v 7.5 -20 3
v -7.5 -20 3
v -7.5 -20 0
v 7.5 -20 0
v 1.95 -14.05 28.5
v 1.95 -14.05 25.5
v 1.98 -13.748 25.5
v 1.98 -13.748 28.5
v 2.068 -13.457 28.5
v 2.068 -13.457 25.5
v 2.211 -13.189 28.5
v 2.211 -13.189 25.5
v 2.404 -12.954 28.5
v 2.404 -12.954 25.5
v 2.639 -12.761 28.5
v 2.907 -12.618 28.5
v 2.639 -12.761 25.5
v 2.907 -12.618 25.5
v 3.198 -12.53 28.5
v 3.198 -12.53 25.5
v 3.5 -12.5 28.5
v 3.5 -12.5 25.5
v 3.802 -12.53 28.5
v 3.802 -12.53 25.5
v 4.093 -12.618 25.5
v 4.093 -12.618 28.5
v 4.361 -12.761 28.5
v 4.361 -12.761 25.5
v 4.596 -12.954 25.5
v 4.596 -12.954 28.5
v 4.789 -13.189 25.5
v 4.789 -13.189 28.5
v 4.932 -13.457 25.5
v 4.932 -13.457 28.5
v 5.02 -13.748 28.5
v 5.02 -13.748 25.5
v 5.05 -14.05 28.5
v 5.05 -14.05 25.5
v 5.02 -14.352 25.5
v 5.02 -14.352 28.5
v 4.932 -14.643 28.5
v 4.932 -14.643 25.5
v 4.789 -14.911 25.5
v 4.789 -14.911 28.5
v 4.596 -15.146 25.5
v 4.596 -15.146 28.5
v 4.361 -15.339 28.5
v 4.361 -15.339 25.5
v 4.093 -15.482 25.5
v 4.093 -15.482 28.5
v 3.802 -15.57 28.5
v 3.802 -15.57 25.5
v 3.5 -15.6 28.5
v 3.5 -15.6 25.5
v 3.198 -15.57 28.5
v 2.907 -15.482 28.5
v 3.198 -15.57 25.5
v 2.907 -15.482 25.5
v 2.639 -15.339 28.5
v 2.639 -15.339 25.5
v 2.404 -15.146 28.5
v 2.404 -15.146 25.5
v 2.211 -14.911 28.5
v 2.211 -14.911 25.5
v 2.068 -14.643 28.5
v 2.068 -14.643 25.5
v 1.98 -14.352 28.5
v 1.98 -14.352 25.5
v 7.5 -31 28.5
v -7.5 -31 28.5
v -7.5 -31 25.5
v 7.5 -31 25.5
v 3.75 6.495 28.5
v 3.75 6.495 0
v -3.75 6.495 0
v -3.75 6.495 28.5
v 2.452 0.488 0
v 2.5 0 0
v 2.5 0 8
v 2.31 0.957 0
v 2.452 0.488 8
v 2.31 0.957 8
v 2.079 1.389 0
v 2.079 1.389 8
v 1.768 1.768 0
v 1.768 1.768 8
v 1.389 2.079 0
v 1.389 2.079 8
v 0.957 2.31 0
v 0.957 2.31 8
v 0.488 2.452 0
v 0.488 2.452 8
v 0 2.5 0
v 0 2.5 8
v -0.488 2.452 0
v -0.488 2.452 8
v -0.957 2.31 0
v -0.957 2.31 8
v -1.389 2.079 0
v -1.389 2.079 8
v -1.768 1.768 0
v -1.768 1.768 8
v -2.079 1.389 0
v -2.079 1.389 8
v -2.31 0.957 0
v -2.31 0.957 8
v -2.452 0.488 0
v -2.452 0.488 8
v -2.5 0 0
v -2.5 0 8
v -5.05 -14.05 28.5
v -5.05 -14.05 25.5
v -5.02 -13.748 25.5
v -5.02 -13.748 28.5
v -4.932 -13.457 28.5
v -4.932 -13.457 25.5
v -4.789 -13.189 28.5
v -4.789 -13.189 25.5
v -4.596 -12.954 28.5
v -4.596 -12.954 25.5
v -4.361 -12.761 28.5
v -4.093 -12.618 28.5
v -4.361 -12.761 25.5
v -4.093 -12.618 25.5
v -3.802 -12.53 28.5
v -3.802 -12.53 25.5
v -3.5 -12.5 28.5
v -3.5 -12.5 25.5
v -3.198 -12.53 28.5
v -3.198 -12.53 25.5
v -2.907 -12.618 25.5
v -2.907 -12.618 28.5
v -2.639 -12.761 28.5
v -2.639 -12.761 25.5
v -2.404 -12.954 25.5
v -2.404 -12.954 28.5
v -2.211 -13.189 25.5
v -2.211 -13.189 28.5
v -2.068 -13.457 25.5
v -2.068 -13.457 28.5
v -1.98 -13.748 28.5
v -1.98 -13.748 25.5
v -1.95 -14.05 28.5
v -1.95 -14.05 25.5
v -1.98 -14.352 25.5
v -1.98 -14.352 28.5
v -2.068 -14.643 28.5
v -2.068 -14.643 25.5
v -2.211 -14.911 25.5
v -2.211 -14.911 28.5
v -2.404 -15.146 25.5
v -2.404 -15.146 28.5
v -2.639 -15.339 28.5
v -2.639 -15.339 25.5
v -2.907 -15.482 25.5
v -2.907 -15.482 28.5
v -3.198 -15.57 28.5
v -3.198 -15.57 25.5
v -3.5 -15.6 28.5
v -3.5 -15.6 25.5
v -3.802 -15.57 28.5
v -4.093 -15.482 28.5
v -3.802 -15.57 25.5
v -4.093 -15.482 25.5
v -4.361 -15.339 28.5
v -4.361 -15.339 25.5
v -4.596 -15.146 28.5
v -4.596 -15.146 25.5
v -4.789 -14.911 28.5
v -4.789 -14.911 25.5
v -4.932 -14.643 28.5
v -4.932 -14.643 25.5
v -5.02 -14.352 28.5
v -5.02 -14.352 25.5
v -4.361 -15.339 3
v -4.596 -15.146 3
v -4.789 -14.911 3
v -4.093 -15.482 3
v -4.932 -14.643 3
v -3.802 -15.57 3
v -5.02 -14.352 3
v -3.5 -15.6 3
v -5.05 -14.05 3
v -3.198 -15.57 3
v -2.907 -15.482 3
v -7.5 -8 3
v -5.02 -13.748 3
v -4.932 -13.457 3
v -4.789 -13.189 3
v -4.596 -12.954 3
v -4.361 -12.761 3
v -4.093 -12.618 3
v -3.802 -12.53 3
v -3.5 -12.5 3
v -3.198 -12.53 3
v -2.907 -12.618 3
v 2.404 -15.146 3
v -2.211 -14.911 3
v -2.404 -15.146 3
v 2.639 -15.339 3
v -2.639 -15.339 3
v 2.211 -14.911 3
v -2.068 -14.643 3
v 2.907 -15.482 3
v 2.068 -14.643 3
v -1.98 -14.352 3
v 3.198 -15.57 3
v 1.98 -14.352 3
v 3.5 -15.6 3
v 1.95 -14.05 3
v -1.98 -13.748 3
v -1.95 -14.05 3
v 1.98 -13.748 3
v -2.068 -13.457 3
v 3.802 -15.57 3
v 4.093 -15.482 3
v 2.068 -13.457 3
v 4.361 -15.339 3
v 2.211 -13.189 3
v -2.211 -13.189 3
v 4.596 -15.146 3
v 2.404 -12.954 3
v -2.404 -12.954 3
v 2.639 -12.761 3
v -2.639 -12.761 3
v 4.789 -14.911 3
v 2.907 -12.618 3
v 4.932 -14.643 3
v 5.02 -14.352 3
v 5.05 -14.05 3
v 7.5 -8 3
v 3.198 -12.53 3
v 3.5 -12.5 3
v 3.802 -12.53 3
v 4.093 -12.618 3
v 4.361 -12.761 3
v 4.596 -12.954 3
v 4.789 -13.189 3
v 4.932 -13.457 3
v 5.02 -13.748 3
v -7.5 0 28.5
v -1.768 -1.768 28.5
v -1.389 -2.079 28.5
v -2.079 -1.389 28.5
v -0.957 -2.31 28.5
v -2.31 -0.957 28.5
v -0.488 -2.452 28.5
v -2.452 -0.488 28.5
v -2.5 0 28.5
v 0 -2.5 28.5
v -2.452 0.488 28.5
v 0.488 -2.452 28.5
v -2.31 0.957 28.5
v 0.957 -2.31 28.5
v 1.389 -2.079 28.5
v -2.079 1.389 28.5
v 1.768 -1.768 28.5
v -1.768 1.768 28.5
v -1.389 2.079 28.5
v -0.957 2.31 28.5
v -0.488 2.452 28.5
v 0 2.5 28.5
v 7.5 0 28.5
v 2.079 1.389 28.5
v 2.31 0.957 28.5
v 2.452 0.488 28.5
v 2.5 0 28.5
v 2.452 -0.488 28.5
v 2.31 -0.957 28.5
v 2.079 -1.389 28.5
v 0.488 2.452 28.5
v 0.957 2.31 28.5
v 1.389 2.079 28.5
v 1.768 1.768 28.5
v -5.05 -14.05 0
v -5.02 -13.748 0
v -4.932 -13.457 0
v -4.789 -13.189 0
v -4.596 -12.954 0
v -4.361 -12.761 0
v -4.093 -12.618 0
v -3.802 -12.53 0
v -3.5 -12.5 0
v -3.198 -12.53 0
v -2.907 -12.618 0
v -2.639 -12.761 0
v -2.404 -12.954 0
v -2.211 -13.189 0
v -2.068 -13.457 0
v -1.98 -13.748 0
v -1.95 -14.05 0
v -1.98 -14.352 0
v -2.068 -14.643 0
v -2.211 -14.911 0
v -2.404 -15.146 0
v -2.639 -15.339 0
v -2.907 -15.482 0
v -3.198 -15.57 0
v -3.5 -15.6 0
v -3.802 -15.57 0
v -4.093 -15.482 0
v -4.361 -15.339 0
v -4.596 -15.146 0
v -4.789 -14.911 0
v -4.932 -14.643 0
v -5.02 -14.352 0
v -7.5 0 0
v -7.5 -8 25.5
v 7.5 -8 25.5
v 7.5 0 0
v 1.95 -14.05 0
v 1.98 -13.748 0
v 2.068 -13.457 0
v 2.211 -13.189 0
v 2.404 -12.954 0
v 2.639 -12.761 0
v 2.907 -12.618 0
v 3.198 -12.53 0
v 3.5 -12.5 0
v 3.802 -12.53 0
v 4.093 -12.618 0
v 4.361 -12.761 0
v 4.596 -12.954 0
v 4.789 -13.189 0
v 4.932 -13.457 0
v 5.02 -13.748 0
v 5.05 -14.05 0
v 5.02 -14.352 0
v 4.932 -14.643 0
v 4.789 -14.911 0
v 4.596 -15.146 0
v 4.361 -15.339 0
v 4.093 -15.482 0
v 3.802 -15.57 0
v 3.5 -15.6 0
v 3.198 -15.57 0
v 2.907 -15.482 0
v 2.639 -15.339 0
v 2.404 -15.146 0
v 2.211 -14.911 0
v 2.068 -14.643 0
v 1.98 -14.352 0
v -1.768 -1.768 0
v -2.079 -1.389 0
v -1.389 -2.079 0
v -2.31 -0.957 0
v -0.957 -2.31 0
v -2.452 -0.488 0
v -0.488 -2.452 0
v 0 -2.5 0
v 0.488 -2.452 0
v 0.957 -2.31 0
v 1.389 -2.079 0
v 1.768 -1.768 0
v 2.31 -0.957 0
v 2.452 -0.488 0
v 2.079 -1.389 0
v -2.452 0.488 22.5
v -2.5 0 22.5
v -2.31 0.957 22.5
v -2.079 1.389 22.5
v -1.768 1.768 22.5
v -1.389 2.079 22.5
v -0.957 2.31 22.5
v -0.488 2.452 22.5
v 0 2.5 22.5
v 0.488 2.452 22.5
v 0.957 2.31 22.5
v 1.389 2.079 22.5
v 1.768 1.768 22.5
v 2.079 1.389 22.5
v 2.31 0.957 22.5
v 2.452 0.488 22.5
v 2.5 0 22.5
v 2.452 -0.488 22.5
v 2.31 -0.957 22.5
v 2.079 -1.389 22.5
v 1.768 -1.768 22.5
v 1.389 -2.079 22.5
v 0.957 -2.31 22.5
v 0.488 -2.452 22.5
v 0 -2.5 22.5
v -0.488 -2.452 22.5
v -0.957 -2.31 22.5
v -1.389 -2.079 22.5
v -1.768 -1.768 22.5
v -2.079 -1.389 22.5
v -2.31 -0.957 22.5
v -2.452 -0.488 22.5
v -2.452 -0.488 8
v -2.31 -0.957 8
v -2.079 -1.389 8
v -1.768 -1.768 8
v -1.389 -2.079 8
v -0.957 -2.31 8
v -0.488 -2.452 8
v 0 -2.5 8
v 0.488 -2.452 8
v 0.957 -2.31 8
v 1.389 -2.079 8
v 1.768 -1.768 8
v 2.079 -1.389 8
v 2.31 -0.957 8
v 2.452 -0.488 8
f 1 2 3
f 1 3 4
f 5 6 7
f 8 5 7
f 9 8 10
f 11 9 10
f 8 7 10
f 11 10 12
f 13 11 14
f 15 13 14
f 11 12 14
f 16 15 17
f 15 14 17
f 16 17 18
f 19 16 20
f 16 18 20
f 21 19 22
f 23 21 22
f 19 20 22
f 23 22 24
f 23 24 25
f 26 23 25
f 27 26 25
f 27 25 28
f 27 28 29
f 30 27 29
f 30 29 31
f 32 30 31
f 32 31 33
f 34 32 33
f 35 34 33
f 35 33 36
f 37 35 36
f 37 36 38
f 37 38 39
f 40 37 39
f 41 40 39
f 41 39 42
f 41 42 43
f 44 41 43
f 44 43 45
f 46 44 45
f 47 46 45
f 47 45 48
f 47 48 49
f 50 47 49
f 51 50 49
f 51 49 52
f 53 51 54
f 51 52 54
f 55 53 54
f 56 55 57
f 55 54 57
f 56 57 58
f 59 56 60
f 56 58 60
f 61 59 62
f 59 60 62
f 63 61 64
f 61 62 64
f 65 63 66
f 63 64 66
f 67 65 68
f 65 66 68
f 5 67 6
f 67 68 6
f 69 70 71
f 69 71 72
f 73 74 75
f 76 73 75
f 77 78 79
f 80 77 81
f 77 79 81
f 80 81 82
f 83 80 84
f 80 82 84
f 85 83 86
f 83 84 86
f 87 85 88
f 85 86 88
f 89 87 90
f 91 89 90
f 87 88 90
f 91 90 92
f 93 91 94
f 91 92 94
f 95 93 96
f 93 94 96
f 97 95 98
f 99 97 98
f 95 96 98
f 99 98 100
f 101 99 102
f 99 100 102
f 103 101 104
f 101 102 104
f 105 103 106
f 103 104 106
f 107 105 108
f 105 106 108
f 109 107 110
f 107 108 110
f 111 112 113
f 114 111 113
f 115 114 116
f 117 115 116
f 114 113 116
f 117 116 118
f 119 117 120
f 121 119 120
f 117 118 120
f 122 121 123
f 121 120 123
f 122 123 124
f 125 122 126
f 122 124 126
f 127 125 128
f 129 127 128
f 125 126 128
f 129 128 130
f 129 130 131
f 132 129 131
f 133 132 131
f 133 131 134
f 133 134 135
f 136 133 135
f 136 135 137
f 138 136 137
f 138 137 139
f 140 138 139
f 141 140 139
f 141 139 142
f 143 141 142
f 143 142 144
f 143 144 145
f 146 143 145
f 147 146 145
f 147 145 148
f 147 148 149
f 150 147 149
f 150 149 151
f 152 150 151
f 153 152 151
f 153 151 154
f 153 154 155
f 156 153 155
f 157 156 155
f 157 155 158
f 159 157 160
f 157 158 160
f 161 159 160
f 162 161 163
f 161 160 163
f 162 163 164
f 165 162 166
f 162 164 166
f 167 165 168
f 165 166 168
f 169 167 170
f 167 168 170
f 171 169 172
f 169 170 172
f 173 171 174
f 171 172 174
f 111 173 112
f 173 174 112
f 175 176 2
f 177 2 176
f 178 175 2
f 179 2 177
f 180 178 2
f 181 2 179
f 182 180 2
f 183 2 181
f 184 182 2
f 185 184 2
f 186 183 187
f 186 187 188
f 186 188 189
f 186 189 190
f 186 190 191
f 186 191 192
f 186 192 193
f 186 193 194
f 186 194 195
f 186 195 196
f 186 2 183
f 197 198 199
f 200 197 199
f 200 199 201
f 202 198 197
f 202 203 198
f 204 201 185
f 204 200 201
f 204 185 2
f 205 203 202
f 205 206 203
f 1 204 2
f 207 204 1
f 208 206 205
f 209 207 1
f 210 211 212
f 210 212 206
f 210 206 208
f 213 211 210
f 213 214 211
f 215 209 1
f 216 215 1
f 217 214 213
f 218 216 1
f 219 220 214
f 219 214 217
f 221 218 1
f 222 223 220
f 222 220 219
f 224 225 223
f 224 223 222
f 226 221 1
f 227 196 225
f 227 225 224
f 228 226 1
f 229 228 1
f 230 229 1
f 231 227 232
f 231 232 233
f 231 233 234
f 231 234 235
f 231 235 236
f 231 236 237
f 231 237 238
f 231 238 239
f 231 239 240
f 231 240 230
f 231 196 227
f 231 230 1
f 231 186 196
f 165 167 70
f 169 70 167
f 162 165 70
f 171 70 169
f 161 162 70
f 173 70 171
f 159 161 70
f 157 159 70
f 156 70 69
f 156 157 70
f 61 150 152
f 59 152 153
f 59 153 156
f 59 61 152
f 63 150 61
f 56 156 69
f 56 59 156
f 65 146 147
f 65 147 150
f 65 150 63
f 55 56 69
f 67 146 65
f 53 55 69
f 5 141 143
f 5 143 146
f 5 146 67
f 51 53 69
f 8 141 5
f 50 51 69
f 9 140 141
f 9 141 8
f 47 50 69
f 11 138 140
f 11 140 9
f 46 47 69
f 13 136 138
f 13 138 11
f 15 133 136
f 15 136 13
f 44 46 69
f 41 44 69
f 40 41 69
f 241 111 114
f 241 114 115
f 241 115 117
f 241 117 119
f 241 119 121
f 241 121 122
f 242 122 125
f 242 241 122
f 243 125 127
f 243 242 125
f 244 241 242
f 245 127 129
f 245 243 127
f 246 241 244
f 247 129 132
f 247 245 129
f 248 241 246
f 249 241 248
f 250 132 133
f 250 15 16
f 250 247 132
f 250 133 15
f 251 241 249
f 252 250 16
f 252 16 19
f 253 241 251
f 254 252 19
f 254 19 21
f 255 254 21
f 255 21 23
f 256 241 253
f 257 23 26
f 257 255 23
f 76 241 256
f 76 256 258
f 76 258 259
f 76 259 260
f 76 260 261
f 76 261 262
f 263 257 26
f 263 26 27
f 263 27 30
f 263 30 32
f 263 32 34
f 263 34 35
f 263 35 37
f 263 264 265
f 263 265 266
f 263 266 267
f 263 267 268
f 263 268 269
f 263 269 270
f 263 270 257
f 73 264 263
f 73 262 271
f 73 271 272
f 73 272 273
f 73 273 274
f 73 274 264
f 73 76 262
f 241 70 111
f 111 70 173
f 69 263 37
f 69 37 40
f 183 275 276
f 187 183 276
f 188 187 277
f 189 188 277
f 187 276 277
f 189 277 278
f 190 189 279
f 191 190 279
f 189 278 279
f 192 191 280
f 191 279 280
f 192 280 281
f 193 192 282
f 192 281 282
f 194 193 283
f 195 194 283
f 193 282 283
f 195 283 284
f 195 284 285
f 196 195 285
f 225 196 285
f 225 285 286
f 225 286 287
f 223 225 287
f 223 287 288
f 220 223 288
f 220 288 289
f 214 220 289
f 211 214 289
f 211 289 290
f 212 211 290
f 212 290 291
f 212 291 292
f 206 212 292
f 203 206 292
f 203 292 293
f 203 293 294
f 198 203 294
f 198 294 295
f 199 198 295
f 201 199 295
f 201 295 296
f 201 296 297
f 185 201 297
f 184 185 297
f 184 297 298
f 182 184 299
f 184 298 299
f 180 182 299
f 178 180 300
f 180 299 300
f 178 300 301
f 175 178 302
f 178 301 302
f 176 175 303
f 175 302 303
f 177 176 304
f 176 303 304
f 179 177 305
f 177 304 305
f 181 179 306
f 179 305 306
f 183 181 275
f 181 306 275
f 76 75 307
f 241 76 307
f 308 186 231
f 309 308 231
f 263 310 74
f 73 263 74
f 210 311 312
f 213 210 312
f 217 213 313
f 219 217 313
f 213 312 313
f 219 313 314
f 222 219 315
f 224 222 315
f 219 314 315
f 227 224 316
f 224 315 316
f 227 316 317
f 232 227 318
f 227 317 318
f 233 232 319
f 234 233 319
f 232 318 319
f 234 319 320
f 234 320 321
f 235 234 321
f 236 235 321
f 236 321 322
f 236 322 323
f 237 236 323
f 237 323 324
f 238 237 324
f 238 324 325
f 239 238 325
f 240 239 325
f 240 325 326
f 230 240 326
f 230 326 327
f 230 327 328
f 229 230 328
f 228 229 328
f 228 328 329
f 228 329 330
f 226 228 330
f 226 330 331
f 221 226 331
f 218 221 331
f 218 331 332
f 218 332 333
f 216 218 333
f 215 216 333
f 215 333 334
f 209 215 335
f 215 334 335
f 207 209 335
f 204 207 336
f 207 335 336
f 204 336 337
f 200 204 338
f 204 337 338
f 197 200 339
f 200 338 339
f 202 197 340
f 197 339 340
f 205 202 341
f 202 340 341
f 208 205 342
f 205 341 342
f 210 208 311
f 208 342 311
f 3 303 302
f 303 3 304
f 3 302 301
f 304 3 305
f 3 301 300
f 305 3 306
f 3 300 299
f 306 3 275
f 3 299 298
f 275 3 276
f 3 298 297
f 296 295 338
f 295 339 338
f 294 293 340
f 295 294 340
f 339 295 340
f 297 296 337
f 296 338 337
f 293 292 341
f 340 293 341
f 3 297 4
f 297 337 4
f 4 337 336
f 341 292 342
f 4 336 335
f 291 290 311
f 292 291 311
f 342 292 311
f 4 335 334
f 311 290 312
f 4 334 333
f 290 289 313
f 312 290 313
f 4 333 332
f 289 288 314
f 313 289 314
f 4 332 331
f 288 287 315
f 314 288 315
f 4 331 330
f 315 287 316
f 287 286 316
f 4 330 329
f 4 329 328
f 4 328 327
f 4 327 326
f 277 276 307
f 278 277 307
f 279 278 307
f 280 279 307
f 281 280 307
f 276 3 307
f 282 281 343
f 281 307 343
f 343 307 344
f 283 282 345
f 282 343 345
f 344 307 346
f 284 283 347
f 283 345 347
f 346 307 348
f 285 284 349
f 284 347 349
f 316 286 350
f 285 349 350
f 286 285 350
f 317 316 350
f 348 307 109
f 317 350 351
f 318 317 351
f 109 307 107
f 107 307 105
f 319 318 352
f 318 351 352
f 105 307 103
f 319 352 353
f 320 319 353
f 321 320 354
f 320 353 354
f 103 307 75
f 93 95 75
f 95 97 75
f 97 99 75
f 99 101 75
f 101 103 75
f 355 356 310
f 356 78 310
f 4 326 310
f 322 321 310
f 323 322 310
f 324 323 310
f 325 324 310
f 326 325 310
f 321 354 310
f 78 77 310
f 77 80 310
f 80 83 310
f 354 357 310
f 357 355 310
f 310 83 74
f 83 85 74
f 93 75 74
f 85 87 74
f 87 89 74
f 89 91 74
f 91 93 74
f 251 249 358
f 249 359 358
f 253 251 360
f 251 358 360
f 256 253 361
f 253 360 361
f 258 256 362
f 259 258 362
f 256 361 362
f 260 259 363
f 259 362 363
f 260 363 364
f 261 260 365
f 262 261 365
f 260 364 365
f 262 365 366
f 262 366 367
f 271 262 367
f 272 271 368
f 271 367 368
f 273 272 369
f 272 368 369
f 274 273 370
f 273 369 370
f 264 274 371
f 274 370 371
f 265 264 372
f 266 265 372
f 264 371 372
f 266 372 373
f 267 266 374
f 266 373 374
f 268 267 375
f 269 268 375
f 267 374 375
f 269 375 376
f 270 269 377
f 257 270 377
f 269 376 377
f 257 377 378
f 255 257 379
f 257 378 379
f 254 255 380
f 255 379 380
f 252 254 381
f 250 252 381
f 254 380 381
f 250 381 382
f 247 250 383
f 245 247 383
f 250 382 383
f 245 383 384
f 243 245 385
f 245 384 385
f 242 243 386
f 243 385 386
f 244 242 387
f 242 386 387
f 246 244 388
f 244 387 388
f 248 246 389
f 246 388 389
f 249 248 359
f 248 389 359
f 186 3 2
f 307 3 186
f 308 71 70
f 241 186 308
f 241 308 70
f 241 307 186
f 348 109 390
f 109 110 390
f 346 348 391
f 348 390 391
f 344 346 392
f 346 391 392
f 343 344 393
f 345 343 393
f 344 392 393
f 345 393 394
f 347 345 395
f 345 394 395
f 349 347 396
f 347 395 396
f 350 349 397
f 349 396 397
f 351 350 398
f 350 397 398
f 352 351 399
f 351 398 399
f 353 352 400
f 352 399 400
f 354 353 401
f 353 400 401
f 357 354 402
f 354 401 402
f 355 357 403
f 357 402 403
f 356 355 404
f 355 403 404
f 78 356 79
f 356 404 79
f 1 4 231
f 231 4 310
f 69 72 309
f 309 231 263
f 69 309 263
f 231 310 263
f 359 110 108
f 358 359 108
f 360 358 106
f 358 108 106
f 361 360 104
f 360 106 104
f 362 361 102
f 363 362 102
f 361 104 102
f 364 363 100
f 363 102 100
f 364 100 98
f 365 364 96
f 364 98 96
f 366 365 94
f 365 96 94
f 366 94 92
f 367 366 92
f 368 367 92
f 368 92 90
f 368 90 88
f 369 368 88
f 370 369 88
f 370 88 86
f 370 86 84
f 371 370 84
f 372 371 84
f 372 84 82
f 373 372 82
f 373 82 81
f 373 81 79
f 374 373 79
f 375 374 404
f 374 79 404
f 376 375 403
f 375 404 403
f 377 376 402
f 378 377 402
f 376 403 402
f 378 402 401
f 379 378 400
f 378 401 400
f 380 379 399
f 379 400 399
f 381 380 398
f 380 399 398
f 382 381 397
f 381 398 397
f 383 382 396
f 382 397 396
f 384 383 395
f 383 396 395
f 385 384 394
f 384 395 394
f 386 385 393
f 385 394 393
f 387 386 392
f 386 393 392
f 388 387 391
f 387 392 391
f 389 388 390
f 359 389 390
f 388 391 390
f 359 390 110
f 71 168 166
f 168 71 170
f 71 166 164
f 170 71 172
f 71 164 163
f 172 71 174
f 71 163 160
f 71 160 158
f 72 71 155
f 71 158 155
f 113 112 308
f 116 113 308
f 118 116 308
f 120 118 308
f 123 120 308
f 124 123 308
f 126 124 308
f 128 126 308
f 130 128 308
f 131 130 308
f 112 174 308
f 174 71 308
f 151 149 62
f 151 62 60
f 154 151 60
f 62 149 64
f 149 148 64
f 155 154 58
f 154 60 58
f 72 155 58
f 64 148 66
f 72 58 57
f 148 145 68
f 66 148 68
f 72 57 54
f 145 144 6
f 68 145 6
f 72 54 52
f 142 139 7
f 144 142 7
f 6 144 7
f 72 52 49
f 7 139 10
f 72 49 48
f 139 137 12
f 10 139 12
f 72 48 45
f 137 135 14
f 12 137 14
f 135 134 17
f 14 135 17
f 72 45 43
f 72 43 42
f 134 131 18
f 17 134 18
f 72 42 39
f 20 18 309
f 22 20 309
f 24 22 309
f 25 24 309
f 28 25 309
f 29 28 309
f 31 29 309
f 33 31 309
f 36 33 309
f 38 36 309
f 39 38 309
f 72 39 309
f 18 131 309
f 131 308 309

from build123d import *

# Parameters (mm, degrees)
BOSS_EXTRUDE1_DEPTH   = 28.5
SKETCH2_W             = 15
SKETCH2_H             = 3
BOSS_EXTRUDE2_DEPTH   = 23
SKETCH2_3_W           = 15
SKETCH2_3_H           = 3
BOSS_EXTRUDE3_DEPTH   = 12
SKETCH5_R             = 1.55
CUT_EXTRUDE1_DEPTH    = 29.5
M6_TAPPED_HOLE1_D     = 5
M6_TAPPED_HOLE1_DEPTH = 8
M6_TAPPED_HOLE1_TIP   = 1.502151548
M6_TAPPED_HOLE2_D     = 5
M6_TAPPED_HOLE2_DEPTH = 6
M6_TAPPED_HOLE2_TIP   = 1.502151548
SKETCH6_R             = 2.5
CUT_EXTRUDE2_DEPTH    = 29.5


with BuildPart() as part:
    # Sketch1 → Boss-Extrude1 (new body)
    with BuildSketch(Plane.XY):
        Polygon((-7.5, 0), (-7.5, -8), (7.5, -8), (7.5, 0), (3.75, 6.495190528), (-3.75, 6.495190528), align=None)
    extrude(amount=BOSS_EXTRUDE1_DEPTH)

    # Sketch2 → Boss-Extrude2 (add)
    with BuildSketch(Plane.XZ.offset(8)):
        with Locations((0, 27)):
            Rectangle(SKETCH2_W, SKETCH2_H)
    extrude(amount=BOSS_EXTRUDE2_DEPTH)

    # Sketch2<3> → Boss-Extrude3 (add)
    with BuildSketch(Plane.XZ.offset(8)):
        with Locations((0, 1.5)):
            Rectangle(SKETCH2_3_W, SKETCH2_3_H)
    extrude(amount=BOSS_EXTRUDE3_DEPTH)

    # Sketch5 → Cut-Extrude1 (cut, through all)
    with BuildSketch(Plane(origin=(0, 0, 0), x_dir=(-1, 0, 0), z_dir=(0, 0, -1))):
        with Locations((-3.5, -14.05)):
            Circle(SKETCH5_R)
        with Locations((3.5, -14.05)):
            Circle(SKETCH5_R)
    extrude(amount=-CUT_EXTRUDE1_DEPTH, mode=Mode.SUBTRACT)

    # M6 Tapped Hole1
    with Locations(Plane(origin=(0, 0, 0), x_dir=(-1, 0, 0), z_dir=(0, 0, -1))):
        with Locations((0, 0)):
            Hole(M6_TAPPED_HOLE1_D / 2, depth=M6_TAPPED_HOLE1_DEPTH)
            with Locations((0, 0, -(M6_TAPPED_HOLE1_DEPTH + M6_TAPPED_HOLE1_TIP / 2))):  # 118° drill point
                Cone(0, M6_TAPPED_HOLE1_D / 2, M6_TAPPED_HOLE1_TIP, mode=Mode.SUBTRACT)

    # M6 Tapped Hole2
    with Locations(Plane.XY.offset(28.5)):
        with Locations((0, 0)):
            Hole(M6_TAPPED_HOLE2_D / 2, depth=M6_TAPPED_HOLE2_DEPTH)
            with Locations((0, 0, -(M6_TAPPED_HOLE2_DEPTH + M6_TAPPED_HOLE2_TIP / 2))):  # 118° drill point
                Cone(0, M6_TAPPED_HOLE2_D / 2, M6_TAPPED_HOLE2_TIP, mode=Mode.SUBTRACT)

    # Sketch6 → Cut-Extrude2 (cut, through all)
    with BuildSketch(Plane(origin=(0, 0, 0), x_dir=(-1, 0, 0), z_dir=(0, 0, -1))):
        Circle(SKETCH6_R)
    extrude(amount=-CUT_EXTRUDE2_DEPTH, mode=Mode.SUBTRACT)


solid = part.part
